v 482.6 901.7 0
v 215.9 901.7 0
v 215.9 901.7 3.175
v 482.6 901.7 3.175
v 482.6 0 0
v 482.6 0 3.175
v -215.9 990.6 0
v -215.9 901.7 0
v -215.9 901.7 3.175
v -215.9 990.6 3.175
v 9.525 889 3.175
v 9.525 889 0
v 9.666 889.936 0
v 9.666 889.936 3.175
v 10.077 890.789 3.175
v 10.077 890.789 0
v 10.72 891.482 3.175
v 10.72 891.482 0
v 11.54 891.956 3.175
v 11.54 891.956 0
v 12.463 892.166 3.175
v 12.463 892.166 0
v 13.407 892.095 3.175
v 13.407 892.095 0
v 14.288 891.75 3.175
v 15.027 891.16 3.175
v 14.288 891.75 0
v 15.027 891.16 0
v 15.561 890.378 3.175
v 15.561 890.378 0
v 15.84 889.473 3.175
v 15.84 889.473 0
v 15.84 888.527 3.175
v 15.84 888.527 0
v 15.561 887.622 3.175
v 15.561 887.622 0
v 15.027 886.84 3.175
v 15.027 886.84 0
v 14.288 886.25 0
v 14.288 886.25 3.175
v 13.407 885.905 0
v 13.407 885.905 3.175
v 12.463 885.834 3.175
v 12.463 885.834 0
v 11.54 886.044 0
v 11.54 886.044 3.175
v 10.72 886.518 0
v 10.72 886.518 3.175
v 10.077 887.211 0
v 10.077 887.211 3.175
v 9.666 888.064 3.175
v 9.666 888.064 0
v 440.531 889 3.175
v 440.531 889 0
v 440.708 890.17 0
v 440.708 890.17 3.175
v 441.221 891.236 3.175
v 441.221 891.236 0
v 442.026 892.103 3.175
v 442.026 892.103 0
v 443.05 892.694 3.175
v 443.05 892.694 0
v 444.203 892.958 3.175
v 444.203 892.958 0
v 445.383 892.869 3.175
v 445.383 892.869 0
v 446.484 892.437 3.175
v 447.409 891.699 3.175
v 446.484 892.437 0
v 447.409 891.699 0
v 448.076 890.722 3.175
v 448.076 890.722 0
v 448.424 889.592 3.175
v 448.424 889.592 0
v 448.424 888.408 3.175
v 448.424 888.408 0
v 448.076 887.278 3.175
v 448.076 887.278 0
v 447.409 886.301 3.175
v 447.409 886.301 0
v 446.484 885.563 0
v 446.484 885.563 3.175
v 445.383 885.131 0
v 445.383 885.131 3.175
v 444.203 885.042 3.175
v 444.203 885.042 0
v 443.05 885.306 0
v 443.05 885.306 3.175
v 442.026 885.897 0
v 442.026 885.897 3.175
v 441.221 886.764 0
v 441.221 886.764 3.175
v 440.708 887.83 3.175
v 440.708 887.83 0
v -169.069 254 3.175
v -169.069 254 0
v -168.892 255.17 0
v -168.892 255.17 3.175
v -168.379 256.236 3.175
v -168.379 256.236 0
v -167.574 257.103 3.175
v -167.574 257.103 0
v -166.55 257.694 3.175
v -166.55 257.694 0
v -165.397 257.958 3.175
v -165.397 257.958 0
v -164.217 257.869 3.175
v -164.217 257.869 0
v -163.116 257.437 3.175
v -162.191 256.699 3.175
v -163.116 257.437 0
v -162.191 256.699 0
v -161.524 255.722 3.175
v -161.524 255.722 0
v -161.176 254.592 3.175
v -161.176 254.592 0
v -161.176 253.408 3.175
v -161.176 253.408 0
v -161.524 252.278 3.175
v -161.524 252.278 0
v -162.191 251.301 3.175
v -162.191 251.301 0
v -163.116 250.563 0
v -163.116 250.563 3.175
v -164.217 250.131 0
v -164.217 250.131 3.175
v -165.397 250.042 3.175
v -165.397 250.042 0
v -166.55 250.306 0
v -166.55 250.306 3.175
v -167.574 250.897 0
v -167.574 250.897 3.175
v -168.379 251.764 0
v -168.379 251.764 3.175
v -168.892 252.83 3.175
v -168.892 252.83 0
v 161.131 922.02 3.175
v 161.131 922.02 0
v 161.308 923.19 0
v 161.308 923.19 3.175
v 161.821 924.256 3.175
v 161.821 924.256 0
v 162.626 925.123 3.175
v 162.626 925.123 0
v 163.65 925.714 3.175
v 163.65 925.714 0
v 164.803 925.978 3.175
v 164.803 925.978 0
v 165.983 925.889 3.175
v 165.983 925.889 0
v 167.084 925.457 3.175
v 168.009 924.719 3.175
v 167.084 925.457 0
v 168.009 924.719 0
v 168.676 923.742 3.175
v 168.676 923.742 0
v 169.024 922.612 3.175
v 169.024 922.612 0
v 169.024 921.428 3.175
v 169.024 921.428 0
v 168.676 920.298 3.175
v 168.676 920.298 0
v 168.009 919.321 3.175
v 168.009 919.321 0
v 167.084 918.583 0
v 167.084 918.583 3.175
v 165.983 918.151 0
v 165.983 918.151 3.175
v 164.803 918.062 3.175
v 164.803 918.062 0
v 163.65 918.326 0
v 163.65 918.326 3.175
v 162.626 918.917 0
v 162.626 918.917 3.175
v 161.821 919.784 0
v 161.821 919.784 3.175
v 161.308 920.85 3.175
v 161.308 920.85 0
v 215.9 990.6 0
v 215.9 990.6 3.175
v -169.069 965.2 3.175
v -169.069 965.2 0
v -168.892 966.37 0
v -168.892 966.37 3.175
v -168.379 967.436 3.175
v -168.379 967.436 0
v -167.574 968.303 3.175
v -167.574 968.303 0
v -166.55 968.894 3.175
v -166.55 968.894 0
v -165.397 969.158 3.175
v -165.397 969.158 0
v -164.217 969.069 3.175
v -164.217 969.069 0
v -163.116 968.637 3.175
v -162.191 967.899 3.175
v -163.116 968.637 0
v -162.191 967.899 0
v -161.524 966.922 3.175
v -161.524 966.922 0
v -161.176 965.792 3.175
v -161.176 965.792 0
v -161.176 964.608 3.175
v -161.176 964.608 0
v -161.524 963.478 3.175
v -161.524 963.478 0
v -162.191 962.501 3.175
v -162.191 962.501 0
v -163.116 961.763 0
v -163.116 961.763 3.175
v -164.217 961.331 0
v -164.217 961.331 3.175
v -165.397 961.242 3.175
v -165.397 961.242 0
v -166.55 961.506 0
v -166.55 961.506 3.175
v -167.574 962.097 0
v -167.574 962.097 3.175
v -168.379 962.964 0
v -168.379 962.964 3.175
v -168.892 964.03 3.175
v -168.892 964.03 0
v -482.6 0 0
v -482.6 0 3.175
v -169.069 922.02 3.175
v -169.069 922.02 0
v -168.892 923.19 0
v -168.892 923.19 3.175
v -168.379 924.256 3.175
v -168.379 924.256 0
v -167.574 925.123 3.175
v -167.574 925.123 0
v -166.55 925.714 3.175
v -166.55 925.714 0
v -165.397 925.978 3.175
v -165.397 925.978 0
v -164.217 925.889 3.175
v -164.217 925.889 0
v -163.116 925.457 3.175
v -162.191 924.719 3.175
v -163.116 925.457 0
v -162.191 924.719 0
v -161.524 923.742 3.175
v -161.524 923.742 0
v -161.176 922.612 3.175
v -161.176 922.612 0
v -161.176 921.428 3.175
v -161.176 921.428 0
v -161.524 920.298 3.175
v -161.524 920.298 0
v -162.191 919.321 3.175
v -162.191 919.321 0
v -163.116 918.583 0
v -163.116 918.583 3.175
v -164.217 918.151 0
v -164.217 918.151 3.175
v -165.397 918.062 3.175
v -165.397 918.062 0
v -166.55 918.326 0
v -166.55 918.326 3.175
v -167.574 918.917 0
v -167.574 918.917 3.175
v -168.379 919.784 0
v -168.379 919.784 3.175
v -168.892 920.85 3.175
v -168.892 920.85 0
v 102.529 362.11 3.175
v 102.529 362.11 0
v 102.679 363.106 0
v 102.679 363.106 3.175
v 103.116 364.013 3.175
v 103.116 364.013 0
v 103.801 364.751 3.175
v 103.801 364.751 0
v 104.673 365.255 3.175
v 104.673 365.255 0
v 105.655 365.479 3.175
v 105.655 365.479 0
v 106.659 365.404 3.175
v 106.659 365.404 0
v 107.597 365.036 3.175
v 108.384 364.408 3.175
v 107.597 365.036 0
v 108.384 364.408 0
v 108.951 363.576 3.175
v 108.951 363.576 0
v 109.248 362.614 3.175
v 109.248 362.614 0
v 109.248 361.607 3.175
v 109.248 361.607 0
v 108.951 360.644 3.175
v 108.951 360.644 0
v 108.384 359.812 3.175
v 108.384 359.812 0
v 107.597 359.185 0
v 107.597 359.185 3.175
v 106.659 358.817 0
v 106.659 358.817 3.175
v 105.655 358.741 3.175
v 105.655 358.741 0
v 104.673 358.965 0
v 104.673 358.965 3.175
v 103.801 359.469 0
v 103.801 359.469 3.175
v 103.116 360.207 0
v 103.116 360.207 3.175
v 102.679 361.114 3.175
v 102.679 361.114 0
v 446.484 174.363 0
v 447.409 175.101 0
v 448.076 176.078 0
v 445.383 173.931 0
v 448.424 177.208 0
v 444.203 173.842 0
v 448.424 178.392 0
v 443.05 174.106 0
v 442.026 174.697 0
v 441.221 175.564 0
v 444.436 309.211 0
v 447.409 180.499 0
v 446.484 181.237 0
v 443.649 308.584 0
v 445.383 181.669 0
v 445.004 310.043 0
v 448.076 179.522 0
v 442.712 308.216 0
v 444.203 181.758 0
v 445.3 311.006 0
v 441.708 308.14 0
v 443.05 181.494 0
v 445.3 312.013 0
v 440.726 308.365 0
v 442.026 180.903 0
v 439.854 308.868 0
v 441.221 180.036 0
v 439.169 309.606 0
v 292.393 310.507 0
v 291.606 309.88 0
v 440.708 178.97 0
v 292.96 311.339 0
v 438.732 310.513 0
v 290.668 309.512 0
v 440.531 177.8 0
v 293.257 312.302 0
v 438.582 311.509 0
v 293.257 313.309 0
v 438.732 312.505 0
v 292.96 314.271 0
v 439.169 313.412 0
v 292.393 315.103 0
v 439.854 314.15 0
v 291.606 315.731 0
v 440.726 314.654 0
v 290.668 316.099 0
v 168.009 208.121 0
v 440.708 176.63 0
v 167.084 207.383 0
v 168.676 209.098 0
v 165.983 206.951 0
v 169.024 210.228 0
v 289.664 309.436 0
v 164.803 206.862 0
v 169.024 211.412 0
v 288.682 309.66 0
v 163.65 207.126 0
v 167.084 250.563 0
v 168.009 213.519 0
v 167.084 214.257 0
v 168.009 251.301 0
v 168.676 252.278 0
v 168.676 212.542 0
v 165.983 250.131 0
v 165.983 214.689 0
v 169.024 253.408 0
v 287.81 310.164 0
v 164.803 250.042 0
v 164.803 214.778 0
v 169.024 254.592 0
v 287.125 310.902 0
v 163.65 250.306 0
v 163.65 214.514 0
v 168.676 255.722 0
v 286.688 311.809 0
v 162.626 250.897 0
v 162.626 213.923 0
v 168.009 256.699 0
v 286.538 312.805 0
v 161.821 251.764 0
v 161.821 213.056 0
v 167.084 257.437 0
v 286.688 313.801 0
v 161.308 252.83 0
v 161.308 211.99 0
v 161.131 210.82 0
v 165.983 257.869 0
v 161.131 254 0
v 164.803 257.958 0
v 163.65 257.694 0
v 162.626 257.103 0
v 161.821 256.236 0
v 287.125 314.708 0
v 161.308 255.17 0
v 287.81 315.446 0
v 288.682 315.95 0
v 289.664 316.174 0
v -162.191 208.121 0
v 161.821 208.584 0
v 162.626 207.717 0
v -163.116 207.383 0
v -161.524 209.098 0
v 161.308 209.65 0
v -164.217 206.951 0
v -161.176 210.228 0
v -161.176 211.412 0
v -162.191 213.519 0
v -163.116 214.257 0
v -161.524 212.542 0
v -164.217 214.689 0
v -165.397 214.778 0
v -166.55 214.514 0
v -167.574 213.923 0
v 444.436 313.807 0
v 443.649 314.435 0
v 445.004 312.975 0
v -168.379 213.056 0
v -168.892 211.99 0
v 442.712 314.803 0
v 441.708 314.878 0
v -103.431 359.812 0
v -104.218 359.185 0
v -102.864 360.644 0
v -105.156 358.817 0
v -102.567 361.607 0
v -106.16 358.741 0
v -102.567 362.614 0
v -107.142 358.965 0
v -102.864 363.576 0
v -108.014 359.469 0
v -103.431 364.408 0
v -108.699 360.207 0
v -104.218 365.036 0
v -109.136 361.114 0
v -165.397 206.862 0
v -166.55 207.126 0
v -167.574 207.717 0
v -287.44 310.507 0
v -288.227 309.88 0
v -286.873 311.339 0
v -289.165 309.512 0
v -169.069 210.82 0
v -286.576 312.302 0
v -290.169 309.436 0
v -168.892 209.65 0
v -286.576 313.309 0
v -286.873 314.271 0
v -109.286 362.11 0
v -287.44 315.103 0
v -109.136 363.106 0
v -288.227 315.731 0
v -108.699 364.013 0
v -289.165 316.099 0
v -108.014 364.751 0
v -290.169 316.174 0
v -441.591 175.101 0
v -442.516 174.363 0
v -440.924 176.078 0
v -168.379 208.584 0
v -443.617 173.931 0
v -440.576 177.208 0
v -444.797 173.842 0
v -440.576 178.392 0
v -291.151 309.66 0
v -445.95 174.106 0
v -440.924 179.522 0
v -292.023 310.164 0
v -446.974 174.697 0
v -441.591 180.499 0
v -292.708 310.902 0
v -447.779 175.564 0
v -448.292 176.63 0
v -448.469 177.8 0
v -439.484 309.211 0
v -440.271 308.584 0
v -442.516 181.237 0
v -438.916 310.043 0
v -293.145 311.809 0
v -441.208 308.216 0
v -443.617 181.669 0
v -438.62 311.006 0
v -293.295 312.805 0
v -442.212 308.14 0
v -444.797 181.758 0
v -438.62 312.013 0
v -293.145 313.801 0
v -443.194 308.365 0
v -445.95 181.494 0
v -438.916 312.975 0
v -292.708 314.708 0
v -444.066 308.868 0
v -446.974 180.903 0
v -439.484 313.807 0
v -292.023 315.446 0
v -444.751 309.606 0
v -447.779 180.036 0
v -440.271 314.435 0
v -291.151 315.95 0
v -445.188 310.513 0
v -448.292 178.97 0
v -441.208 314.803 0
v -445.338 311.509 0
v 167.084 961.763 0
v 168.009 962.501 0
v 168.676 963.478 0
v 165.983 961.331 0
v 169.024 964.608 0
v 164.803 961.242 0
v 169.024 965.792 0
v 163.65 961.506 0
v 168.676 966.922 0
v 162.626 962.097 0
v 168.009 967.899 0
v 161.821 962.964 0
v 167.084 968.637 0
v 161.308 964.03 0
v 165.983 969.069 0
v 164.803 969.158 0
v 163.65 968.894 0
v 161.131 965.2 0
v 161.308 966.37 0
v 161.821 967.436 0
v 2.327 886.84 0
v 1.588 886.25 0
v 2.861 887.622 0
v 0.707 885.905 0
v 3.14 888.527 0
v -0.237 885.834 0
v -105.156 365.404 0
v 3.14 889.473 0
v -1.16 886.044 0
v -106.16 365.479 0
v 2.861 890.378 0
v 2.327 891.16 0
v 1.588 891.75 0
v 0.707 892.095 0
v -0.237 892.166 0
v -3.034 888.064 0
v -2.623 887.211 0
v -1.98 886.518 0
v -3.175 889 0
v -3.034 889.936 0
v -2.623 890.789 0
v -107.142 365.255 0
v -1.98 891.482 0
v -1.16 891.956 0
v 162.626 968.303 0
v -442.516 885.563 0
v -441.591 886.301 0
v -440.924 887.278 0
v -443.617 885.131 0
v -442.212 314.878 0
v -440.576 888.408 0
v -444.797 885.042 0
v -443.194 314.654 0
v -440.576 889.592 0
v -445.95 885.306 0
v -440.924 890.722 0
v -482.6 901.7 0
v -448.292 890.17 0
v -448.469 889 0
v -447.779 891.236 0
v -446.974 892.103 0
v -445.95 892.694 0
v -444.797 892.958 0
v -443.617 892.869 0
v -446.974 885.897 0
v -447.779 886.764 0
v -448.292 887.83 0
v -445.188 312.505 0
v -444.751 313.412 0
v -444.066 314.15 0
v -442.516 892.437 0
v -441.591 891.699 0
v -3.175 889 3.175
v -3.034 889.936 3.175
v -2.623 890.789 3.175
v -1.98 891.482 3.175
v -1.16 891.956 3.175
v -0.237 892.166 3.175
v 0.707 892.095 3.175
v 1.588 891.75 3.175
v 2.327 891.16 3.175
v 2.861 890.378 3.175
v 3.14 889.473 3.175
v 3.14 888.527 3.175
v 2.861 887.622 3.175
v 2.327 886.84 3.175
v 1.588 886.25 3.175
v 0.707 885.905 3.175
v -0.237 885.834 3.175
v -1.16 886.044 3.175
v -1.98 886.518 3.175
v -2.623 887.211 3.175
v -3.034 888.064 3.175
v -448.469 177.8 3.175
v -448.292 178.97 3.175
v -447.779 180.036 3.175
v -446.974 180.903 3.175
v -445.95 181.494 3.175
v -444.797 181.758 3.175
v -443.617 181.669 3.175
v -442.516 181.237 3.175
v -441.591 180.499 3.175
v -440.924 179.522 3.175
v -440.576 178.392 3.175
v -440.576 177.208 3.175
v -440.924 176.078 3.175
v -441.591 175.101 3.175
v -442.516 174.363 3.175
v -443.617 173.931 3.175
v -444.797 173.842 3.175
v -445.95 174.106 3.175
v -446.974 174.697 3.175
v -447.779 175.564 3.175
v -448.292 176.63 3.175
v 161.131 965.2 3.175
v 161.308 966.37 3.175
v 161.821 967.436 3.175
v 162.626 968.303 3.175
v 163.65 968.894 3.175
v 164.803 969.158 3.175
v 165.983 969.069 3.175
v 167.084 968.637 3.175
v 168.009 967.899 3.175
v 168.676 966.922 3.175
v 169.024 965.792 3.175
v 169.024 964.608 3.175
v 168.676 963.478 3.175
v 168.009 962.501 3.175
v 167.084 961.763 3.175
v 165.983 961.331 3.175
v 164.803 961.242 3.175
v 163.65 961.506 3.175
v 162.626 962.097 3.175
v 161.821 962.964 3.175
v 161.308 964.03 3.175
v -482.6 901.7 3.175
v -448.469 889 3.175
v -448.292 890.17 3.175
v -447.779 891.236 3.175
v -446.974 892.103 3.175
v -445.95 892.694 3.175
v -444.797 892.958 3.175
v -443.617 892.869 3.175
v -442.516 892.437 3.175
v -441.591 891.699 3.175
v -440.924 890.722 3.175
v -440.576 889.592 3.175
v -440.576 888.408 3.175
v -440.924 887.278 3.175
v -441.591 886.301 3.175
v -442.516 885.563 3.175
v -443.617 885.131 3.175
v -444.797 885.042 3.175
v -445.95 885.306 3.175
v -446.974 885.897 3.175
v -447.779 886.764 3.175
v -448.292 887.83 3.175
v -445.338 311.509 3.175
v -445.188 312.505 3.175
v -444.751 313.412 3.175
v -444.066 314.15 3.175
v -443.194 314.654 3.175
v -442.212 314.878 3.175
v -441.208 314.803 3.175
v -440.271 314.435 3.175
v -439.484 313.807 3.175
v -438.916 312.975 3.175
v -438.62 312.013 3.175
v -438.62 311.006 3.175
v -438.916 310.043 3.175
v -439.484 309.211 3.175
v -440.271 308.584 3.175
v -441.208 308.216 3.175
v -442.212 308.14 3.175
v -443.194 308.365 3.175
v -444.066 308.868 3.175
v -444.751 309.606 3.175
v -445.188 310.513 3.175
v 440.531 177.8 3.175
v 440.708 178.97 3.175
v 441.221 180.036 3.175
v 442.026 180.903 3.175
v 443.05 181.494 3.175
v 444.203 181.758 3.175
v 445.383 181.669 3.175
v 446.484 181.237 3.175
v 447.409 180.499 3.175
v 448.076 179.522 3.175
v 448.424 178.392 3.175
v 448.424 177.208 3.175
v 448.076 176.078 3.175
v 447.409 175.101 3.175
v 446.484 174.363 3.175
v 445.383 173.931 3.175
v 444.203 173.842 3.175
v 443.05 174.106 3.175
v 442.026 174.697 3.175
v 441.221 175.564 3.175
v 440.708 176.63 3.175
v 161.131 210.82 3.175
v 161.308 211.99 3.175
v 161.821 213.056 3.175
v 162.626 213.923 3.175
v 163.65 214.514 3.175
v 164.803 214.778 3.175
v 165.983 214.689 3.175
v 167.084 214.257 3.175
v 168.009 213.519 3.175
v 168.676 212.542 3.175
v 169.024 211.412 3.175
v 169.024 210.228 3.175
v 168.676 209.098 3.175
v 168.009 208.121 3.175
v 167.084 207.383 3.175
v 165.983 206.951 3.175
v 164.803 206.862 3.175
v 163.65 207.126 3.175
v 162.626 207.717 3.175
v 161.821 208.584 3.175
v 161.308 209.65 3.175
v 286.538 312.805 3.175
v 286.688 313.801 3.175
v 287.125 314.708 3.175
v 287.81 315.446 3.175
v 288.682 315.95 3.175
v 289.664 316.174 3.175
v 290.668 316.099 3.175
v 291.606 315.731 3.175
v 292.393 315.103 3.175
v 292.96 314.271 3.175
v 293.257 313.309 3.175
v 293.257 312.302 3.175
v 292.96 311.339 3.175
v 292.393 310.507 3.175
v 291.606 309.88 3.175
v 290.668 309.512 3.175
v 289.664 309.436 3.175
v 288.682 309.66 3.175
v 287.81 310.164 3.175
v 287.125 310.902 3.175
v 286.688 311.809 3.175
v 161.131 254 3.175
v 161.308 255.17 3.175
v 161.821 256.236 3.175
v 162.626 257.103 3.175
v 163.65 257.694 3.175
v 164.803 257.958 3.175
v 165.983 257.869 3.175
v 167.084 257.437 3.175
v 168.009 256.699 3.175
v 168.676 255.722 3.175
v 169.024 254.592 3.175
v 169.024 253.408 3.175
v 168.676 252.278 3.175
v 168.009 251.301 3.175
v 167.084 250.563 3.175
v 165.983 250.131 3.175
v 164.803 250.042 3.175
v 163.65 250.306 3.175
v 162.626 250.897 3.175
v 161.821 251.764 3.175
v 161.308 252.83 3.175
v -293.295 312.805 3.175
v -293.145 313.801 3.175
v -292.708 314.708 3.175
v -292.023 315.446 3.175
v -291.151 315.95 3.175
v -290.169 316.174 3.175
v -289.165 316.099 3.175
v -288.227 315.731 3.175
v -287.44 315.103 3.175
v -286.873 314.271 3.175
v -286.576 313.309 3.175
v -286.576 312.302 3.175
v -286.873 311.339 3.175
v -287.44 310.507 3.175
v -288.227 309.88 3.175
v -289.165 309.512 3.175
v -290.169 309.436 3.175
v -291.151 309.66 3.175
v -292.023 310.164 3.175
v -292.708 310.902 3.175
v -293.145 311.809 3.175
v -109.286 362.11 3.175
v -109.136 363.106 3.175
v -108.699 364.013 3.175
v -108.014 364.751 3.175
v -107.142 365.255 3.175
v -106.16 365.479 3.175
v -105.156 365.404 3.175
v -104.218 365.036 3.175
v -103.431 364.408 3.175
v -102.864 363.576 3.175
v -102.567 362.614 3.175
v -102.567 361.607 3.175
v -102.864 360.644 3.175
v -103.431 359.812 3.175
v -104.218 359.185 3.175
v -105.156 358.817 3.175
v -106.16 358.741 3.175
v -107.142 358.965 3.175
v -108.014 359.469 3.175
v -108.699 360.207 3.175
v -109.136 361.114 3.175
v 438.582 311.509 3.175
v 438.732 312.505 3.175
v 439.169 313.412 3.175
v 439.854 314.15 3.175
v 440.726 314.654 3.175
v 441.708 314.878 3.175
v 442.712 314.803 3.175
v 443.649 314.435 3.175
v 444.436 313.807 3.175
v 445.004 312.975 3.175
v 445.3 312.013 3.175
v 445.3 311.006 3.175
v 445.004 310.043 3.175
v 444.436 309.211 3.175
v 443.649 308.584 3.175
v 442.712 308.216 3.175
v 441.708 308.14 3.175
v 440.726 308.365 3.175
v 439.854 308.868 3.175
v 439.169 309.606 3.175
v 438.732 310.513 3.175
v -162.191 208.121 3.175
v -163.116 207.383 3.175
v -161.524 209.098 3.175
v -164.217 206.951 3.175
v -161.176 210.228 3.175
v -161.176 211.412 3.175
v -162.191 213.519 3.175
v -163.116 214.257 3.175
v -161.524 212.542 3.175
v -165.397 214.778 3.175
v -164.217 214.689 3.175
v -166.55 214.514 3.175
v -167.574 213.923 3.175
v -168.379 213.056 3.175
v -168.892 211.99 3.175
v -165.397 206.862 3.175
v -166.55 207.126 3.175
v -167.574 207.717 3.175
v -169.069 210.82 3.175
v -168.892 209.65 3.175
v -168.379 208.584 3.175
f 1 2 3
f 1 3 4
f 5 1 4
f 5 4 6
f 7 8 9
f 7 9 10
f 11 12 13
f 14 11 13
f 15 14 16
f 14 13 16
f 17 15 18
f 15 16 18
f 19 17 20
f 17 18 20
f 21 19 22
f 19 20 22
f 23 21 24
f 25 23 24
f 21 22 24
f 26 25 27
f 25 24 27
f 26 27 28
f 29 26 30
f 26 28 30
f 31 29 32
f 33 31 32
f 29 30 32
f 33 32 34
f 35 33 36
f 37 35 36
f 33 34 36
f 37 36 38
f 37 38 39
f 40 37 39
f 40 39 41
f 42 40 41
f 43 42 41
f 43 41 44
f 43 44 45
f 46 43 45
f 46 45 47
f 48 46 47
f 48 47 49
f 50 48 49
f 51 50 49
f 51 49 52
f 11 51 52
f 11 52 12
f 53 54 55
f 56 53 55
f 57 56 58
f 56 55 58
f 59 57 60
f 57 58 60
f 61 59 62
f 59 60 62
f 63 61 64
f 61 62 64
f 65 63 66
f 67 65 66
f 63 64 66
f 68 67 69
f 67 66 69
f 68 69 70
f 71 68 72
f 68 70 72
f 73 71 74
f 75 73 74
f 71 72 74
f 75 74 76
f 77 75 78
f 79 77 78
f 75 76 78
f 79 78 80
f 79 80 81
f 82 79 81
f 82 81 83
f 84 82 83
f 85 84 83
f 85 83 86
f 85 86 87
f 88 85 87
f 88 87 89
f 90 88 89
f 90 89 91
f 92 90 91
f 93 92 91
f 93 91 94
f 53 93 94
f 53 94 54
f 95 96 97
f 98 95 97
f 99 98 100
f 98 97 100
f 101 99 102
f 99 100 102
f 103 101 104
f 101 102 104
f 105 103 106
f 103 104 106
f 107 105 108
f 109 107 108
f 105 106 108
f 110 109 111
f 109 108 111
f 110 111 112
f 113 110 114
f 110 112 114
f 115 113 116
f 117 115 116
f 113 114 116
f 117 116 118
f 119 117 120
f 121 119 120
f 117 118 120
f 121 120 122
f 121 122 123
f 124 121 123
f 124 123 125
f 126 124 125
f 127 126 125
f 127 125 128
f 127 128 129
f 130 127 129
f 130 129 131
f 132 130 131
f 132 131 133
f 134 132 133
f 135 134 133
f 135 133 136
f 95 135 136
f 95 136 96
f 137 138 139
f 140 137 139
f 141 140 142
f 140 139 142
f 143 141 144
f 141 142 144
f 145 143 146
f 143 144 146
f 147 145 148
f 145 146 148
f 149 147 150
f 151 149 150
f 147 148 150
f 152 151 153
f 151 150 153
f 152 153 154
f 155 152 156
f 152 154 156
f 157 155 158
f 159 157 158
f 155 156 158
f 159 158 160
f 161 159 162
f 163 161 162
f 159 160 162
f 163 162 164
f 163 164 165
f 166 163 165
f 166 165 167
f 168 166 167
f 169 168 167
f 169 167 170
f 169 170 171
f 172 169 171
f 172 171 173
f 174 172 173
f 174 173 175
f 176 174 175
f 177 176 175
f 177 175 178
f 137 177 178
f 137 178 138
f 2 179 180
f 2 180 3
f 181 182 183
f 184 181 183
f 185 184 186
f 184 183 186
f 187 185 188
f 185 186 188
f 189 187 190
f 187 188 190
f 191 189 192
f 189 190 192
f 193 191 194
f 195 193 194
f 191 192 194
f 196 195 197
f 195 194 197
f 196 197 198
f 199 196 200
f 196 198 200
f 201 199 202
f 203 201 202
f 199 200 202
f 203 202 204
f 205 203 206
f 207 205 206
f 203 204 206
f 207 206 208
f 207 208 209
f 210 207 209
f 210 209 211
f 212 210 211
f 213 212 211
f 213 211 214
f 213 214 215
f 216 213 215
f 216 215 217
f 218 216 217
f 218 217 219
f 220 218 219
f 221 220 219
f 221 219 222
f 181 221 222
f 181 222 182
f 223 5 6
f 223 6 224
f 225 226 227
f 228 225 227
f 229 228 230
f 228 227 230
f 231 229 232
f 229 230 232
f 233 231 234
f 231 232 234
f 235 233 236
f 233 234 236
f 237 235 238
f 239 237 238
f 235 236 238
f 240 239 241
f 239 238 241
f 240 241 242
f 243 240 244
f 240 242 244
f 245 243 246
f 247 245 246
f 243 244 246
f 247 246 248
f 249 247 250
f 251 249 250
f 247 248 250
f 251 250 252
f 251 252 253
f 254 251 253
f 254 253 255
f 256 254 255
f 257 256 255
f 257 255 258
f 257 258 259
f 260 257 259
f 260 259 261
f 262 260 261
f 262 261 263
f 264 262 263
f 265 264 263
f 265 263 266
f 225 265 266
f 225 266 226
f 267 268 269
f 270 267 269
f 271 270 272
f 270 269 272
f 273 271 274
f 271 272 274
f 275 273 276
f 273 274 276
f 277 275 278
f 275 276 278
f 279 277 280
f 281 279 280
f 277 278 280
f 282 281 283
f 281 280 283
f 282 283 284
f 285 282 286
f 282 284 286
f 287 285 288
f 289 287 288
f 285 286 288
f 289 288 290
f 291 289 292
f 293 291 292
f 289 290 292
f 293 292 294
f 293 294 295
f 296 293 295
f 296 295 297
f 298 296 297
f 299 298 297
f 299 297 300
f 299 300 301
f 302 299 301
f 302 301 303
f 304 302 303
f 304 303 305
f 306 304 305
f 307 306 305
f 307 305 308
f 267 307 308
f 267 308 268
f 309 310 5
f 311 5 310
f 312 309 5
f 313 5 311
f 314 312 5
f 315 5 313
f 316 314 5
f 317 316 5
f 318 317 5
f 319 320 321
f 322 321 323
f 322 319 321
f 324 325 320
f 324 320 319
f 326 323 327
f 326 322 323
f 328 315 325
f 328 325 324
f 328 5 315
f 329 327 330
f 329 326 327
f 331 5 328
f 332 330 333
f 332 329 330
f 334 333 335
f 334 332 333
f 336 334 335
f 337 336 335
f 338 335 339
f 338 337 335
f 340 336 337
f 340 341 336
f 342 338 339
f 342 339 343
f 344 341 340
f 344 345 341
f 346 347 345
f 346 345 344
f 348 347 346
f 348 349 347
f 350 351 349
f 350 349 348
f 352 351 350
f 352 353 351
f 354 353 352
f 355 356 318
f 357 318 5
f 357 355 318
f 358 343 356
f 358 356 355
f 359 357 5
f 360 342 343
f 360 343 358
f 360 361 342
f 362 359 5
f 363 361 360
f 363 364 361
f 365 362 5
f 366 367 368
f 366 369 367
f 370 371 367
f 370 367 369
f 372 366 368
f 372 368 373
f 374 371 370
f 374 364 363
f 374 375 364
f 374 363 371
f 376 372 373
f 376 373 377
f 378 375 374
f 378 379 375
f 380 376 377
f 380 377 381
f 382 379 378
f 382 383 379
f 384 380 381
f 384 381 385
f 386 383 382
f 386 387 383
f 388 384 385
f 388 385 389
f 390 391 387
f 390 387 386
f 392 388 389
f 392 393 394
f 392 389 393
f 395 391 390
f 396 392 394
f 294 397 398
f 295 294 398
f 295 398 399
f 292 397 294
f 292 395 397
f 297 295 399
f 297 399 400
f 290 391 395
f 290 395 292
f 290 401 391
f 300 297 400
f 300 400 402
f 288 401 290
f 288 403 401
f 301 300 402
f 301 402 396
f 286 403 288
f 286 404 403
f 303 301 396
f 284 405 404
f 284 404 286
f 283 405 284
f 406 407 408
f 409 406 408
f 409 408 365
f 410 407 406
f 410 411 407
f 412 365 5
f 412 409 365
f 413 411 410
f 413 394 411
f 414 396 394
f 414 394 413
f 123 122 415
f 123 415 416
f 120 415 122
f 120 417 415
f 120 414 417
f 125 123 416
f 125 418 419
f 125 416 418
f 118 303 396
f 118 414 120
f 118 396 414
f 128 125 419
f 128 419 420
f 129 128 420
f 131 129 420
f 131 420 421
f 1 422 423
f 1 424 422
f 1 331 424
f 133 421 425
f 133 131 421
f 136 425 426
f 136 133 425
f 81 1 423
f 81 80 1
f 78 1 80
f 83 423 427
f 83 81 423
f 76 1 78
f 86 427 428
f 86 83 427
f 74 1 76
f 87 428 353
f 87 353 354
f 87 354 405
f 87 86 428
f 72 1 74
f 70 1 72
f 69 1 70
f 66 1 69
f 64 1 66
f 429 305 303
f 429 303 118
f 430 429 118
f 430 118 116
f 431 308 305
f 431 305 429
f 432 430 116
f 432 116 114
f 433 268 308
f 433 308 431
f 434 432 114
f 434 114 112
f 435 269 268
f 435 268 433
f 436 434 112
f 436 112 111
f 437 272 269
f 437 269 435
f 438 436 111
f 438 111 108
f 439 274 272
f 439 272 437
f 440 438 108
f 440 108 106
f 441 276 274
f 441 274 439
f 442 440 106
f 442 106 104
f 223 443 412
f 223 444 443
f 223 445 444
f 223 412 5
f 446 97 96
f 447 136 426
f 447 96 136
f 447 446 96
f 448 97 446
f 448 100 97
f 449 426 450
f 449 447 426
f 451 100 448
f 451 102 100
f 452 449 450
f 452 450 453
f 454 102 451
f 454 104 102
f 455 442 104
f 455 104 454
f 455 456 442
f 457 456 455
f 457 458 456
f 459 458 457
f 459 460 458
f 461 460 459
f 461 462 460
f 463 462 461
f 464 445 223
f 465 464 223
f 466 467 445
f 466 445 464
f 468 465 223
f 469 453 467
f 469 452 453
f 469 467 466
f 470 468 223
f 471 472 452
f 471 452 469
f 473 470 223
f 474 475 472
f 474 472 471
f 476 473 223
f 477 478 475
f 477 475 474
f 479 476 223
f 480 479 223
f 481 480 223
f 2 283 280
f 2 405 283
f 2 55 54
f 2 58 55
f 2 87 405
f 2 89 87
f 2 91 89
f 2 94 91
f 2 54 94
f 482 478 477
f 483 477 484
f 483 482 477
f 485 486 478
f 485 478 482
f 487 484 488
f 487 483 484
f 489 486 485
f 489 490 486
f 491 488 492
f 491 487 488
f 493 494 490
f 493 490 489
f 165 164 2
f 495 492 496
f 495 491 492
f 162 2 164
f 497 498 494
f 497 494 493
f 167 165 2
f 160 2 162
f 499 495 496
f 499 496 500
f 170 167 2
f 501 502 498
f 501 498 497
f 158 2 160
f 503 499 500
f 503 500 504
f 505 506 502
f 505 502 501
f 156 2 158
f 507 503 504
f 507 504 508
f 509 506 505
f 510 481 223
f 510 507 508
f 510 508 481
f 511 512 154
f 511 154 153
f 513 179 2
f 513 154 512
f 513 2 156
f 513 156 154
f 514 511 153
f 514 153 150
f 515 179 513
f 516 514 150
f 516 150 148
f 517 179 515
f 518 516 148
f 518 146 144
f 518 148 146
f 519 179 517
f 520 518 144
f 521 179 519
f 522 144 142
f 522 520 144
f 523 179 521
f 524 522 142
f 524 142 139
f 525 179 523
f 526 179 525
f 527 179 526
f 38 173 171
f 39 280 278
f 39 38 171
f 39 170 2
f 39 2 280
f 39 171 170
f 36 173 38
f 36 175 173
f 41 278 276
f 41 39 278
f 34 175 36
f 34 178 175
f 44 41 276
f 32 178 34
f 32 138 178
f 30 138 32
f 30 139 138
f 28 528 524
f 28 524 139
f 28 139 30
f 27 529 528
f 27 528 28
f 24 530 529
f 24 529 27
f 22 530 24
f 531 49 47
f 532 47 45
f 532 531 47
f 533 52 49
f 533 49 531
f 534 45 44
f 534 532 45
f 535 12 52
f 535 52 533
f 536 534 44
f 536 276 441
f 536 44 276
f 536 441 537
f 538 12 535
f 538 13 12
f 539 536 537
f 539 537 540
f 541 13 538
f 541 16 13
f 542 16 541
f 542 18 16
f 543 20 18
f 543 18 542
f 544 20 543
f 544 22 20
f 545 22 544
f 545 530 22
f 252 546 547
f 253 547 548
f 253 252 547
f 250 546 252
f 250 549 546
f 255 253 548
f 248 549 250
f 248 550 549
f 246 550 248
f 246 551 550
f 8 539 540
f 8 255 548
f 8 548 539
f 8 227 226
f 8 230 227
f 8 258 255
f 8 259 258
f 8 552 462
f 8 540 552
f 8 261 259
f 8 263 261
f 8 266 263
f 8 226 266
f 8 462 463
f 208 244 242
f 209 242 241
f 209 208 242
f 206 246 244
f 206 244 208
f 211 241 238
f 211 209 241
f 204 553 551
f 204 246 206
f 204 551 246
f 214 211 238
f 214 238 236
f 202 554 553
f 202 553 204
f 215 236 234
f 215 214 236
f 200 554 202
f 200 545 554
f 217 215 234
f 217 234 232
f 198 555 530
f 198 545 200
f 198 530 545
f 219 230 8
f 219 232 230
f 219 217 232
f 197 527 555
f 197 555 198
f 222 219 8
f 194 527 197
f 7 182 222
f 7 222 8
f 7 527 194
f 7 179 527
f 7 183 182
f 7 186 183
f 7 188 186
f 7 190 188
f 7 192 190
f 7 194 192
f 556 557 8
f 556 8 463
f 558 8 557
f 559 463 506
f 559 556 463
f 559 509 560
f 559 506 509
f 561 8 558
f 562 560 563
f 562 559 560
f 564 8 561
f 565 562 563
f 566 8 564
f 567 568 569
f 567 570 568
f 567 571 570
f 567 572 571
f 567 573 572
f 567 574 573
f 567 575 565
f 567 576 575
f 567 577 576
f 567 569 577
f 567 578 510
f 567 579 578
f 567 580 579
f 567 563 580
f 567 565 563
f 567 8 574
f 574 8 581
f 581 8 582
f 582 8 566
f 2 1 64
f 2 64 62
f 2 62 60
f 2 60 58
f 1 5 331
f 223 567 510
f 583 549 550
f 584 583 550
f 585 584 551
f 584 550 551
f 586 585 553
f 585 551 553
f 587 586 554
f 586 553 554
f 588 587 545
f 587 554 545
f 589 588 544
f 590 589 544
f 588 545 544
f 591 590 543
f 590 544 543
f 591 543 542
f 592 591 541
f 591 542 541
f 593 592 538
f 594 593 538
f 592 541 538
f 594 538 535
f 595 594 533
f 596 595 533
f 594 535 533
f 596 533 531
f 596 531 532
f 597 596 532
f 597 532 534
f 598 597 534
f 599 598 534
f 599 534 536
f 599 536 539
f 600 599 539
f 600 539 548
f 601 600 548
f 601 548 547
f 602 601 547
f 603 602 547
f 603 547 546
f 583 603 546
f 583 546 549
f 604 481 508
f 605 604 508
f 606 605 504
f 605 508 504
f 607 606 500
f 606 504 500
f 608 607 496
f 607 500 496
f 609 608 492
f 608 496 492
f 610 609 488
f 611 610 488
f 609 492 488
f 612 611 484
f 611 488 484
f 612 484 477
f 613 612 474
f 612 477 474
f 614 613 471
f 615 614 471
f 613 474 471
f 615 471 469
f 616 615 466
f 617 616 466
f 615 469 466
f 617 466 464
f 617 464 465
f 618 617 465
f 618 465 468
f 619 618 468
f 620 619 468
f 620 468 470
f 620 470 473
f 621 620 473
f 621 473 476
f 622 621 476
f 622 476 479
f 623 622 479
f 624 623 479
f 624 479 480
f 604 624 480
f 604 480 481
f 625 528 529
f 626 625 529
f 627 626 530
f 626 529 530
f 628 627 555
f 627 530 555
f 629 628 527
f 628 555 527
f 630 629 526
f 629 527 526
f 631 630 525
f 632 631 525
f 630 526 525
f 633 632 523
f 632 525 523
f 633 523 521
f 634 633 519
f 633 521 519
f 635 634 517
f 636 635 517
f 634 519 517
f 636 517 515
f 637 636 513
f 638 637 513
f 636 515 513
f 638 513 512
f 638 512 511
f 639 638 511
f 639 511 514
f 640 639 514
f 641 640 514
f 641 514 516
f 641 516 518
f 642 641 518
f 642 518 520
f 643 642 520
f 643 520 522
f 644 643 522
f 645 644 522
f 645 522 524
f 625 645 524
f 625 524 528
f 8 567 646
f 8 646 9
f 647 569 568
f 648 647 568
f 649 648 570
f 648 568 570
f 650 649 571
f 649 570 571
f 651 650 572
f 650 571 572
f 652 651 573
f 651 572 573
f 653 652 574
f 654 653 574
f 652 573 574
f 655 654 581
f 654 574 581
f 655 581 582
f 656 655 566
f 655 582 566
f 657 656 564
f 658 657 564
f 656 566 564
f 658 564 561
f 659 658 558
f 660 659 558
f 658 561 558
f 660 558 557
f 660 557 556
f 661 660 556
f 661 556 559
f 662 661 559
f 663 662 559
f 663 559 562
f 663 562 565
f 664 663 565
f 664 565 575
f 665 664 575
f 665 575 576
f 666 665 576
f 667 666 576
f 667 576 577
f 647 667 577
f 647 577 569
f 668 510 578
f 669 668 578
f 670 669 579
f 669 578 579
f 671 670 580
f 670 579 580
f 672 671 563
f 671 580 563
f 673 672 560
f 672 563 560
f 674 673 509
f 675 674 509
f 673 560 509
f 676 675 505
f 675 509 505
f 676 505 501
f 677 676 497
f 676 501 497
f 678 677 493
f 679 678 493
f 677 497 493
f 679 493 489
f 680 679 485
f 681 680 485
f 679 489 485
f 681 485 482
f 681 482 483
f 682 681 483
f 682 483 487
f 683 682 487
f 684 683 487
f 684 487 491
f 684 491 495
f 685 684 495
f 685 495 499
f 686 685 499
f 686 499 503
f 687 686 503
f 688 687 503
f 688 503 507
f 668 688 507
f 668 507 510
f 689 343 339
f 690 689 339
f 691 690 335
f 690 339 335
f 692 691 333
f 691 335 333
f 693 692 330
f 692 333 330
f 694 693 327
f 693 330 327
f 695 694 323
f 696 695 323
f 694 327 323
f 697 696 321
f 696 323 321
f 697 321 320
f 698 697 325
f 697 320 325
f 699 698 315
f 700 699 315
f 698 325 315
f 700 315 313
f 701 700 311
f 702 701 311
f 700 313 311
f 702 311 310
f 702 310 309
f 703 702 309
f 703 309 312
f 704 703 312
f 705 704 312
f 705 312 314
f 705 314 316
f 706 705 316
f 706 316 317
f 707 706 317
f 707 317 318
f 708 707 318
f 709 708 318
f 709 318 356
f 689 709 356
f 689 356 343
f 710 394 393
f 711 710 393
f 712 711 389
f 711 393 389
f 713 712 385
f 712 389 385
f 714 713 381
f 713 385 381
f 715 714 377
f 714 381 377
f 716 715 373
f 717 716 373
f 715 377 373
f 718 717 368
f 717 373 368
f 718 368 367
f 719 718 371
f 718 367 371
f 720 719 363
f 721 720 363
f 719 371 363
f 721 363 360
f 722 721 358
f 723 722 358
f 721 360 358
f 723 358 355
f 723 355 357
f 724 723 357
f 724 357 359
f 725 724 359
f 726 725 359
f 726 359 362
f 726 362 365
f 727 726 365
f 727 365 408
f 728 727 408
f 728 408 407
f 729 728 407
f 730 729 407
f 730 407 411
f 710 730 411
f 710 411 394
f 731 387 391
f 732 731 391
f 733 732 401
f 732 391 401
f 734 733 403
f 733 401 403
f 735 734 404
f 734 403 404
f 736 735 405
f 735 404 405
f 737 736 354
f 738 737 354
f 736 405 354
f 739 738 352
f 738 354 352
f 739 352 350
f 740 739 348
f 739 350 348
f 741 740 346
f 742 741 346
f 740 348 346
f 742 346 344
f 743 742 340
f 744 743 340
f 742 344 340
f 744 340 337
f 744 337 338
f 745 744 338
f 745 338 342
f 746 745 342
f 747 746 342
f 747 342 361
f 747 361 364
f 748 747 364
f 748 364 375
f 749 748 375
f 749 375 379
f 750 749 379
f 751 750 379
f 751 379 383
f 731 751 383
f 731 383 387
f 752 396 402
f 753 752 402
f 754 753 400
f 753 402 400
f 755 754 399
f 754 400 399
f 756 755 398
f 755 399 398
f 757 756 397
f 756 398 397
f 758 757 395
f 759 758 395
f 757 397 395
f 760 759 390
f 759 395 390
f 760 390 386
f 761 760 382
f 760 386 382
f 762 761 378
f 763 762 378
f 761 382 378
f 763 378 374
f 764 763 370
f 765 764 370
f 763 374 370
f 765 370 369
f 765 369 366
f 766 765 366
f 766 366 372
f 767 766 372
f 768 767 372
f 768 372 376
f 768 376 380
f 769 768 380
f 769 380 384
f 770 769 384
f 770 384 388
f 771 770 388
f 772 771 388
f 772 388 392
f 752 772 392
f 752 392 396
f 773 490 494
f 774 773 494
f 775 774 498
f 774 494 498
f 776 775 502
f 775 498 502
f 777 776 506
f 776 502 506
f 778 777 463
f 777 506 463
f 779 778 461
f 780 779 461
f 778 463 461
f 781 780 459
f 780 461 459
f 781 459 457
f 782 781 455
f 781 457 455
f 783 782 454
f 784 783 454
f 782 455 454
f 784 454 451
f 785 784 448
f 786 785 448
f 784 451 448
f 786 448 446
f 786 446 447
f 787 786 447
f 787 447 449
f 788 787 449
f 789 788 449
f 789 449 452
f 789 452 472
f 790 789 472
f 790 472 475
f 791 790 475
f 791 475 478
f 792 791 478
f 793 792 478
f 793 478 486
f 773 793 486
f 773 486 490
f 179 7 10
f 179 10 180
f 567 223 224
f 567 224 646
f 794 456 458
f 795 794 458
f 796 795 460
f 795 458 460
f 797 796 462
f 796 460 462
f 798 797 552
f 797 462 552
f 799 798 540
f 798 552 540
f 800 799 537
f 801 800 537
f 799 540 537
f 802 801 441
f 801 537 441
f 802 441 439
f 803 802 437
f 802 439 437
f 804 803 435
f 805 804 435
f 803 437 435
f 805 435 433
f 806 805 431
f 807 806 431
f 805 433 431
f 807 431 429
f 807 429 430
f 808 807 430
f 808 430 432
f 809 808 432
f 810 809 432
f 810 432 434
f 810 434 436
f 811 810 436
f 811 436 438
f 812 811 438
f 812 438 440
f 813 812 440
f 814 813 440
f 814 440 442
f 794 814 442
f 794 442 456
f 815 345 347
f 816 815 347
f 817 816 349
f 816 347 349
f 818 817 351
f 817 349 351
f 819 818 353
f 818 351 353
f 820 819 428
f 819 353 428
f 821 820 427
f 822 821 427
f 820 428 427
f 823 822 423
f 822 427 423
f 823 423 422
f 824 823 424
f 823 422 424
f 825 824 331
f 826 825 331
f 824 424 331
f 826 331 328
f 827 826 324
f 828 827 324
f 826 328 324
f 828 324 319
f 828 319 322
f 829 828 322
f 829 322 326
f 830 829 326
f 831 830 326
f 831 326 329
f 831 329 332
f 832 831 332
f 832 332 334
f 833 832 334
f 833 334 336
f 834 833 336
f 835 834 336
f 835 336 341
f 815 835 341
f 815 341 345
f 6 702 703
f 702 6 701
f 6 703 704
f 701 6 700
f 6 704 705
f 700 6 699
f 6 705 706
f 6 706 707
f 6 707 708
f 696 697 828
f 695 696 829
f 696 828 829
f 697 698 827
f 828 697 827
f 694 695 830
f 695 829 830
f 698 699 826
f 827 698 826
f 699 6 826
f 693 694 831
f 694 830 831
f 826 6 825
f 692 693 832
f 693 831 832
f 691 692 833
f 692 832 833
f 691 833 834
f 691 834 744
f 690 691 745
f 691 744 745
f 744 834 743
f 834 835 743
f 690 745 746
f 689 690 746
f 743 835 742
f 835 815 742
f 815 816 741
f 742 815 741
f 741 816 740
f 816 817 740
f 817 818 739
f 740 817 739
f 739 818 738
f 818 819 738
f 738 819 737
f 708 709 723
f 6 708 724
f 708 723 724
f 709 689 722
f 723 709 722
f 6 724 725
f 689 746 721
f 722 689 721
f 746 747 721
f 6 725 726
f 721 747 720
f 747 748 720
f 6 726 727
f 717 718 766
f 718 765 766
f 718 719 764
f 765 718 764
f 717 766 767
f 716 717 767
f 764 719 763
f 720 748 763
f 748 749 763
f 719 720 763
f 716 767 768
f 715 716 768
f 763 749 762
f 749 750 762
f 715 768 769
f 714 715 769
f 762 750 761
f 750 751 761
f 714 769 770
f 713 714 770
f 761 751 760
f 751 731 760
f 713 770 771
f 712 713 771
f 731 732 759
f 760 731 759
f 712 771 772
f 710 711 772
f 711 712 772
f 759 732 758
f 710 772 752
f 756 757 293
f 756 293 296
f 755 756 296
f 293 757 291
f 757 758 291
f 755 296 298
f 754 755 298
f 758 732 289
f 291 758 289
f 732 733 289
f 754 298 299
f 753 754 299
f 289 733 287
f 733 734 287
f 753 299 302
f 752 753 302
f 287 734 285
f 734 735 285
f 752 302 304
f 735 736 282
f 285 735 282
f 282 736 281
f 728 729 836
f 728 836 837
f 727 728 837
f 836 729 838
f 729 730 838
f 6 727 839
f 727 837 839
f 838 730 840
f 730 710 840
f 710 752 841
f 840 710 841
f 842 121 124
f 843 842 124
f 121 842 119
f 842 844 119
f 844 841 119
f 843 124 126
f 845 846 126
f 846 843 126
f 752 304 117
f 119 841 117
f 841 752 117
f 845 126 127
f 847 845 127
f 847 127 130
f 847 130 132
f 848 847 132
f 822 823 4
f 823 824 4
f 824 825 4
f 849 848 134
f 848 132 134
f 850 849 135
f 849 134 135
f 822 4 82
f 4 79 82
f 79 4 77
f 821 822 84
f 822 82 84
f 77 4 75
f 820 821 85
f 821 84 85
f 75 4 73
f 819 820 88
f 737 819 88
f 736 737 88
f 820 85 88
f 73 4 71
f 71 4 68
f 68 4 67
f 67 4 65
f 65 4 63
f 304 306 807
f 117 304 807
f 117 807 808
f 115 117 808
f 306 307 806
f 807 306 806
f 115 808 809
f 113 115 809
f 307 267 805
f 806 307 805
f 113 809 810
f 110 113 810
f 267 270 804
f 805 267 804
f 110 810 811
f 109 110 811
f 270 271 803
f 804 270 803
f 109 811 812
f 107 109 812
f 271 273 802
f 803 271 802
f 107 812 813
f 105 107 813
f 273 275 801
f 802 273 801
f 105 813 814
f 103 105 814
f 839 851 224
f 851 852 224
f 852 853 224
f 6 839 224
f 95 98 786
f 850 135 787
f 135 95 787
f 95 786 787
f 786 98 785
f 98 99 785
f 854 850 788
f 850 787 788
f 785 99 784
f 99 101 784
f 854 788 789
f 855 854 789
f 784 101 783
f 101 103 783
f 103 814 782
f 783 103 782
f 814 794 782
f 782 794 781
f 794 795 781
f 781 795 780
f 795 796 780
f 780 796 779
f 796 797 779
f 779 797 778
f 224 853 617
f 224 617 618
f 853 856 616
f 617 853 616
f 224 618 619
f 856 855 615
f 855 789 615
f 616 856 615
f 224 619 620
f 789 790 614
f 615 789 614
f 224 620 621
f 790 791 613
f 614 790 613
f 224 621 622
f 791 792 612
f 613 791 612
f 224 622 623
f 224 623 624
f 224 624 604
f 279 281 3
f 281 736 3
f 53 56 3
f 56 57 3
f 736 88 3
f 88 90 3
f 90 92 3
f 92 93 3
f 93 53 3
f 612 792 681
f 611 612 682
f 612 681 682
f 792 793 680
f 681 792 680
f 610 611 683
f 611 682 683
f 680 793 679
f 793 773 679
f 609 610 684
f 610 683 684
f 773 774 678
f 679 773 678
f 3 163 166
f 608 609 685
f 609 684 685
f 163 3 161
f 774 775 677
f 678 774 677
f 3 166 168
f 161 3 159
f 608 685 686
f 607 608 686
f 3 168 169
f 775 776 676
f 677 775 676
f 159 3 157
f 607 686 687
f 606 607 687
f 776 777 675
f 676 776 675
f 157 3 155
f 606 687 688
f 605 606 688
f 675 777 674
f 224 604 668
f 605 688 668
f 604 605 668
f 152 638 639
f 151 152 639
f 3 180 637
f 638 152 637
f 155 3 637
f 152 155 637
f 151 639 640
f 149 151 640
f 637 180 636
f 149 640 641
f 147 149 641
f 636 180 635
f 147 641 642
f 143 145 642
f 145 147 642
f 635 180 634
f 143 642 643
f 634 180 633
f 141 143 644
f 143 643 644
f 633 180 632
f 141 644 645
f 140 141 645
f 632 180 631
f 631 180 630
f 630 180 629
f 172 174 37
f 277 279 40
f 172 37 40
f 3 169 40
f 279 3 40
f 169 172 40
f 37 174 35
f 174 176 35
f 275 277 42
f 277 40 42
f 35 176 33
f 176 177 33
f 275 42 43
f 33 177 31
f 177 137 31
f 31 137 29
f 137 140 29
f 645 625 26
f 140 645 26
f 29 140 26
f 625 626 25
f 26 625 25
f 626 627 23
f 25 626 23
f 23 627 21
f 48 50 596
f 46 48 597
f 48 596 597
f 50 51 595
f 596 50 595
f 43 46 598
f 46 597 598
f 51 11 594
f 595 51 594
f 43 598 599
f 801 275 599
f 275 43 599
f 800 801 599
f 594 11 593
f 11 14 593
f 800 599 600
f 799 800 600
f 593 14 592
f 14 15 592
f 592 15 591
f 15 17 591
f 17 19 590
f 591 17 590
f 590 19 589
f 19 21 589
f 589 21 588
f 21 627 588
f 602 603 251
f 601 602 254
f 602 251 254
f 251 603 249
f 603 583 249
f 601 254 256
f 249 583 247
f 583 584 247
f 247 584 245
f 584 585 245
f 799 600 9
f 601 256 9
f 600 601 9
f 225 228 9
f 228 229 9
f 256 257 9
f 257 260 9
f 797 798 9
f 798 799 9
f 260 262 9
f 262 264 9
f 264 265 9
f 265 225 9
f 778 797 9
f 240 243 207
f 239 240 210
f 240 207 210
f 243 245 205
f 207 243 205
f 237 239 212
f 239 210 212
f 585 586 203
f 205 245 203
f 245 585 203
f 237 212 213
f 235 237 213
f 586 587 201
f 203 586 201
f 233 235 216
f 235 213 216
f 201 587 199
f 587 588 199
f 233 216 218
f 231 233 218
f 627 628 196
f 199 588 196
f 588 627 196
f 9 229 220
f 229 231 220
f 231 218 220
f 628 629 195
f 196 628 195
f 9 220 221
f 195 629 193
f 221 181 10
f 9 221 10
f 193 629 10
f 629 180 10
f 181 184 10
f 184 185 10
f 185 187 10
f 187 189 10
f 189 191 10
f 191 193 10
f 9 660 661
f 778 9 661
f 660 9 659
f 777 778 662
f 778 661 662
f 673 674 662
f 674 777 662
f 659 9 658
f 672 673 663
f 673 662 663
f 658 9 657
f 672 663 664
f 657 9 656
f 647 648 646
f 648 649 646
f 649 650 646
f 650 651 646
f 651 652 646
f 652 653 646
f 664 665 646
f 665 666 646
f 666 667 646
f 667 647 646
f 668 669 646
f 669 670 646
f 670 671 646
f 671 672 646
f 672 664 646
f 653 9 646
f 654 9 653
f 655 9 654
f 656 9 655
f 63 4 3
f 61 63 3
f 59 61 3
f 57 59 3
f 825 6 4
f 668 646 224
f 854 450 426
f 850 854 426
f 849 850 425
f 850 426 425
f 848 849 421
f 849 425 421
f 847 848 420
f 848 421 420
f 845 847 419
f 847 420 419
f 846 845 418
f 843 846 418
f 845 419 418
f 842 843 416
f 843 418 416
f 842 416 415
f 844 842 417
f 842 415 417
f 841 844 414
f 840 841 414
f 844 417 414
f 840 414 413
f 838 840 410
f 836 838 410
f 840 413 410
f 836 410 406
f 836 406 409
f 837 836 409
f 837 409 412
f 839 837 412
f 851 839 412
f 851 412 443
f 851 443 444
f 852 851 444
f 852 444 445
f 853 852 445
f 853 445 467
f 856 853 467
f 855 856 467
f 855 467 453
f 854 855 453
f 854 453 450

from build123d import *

# Parameters (mm, degrees)
BOSS_EXTRUDE1_DEPTH            = 3.175
F_1_4_CLEARANCE_HOLE1_D        = 6.7564
F_5_16_0_3125_DIAMETER_HOLE1_D = 7.9375
F_1_4_0_25_DIAMETER_HOLE1_D    = 6.35


with BuildPart() as part:
    # Sketch2 → Boss-Extrude1 (new body)
    with BuildSketch(Plane.XY):
        Polygon((-482.6, 901.7), (-215.9, 901.7), (-215.9, 990.6), (215.9, 990.6), (215.9, 901.7), (482.6, 901.7), (482.6, 0), (-482.6, 0), align=None)
    extrude(amount=BOSS_EXTRUDE1_DEPTH)

    # 1/4 Clearance Hole1 (through all)
    with Locations(Plane.XY.offset(3.175)):
        with Locations((-441.96, 311.50918615), (105.907561142, 362.110143283), (289.91643105, 312.805115191), (-289.91643105, 312.805115191), (-105.907561142, 362.110143283), (441.96, 311.50918615)):
            Hole(F_1_4_CLEARANCE_HOLE1_D / 2)

    # 5/16 (0.3125) Diameter Hole1 (through all)
    with Locations(Plane.XY.offset(3.175)):
        with Locations((-165.1, 922.02), (-165.1, 965.2), (165.1, 965.2), (165.1, 922.02), (-165.1, 210.82), (-165.1, 254), (165.1, 254), (165.1, 210.82), (-444.5, 177.8), (444.5, 177.8), (-444.5, 889), (444.5, 889)):
            Hole(F_5_16_0_3125_DIAMETER_HOLE1_D / 2)

    # 1/4 (0.25) Diameter Hole1 (through all)
    with Locations(Plane.XY.offset(3.175)):
        with Locations((0, 889), (12.7, 889)):
            Hole(F_1_4_0_25_DIAMETER_HOLE1_D / 2)


solid = part.part
